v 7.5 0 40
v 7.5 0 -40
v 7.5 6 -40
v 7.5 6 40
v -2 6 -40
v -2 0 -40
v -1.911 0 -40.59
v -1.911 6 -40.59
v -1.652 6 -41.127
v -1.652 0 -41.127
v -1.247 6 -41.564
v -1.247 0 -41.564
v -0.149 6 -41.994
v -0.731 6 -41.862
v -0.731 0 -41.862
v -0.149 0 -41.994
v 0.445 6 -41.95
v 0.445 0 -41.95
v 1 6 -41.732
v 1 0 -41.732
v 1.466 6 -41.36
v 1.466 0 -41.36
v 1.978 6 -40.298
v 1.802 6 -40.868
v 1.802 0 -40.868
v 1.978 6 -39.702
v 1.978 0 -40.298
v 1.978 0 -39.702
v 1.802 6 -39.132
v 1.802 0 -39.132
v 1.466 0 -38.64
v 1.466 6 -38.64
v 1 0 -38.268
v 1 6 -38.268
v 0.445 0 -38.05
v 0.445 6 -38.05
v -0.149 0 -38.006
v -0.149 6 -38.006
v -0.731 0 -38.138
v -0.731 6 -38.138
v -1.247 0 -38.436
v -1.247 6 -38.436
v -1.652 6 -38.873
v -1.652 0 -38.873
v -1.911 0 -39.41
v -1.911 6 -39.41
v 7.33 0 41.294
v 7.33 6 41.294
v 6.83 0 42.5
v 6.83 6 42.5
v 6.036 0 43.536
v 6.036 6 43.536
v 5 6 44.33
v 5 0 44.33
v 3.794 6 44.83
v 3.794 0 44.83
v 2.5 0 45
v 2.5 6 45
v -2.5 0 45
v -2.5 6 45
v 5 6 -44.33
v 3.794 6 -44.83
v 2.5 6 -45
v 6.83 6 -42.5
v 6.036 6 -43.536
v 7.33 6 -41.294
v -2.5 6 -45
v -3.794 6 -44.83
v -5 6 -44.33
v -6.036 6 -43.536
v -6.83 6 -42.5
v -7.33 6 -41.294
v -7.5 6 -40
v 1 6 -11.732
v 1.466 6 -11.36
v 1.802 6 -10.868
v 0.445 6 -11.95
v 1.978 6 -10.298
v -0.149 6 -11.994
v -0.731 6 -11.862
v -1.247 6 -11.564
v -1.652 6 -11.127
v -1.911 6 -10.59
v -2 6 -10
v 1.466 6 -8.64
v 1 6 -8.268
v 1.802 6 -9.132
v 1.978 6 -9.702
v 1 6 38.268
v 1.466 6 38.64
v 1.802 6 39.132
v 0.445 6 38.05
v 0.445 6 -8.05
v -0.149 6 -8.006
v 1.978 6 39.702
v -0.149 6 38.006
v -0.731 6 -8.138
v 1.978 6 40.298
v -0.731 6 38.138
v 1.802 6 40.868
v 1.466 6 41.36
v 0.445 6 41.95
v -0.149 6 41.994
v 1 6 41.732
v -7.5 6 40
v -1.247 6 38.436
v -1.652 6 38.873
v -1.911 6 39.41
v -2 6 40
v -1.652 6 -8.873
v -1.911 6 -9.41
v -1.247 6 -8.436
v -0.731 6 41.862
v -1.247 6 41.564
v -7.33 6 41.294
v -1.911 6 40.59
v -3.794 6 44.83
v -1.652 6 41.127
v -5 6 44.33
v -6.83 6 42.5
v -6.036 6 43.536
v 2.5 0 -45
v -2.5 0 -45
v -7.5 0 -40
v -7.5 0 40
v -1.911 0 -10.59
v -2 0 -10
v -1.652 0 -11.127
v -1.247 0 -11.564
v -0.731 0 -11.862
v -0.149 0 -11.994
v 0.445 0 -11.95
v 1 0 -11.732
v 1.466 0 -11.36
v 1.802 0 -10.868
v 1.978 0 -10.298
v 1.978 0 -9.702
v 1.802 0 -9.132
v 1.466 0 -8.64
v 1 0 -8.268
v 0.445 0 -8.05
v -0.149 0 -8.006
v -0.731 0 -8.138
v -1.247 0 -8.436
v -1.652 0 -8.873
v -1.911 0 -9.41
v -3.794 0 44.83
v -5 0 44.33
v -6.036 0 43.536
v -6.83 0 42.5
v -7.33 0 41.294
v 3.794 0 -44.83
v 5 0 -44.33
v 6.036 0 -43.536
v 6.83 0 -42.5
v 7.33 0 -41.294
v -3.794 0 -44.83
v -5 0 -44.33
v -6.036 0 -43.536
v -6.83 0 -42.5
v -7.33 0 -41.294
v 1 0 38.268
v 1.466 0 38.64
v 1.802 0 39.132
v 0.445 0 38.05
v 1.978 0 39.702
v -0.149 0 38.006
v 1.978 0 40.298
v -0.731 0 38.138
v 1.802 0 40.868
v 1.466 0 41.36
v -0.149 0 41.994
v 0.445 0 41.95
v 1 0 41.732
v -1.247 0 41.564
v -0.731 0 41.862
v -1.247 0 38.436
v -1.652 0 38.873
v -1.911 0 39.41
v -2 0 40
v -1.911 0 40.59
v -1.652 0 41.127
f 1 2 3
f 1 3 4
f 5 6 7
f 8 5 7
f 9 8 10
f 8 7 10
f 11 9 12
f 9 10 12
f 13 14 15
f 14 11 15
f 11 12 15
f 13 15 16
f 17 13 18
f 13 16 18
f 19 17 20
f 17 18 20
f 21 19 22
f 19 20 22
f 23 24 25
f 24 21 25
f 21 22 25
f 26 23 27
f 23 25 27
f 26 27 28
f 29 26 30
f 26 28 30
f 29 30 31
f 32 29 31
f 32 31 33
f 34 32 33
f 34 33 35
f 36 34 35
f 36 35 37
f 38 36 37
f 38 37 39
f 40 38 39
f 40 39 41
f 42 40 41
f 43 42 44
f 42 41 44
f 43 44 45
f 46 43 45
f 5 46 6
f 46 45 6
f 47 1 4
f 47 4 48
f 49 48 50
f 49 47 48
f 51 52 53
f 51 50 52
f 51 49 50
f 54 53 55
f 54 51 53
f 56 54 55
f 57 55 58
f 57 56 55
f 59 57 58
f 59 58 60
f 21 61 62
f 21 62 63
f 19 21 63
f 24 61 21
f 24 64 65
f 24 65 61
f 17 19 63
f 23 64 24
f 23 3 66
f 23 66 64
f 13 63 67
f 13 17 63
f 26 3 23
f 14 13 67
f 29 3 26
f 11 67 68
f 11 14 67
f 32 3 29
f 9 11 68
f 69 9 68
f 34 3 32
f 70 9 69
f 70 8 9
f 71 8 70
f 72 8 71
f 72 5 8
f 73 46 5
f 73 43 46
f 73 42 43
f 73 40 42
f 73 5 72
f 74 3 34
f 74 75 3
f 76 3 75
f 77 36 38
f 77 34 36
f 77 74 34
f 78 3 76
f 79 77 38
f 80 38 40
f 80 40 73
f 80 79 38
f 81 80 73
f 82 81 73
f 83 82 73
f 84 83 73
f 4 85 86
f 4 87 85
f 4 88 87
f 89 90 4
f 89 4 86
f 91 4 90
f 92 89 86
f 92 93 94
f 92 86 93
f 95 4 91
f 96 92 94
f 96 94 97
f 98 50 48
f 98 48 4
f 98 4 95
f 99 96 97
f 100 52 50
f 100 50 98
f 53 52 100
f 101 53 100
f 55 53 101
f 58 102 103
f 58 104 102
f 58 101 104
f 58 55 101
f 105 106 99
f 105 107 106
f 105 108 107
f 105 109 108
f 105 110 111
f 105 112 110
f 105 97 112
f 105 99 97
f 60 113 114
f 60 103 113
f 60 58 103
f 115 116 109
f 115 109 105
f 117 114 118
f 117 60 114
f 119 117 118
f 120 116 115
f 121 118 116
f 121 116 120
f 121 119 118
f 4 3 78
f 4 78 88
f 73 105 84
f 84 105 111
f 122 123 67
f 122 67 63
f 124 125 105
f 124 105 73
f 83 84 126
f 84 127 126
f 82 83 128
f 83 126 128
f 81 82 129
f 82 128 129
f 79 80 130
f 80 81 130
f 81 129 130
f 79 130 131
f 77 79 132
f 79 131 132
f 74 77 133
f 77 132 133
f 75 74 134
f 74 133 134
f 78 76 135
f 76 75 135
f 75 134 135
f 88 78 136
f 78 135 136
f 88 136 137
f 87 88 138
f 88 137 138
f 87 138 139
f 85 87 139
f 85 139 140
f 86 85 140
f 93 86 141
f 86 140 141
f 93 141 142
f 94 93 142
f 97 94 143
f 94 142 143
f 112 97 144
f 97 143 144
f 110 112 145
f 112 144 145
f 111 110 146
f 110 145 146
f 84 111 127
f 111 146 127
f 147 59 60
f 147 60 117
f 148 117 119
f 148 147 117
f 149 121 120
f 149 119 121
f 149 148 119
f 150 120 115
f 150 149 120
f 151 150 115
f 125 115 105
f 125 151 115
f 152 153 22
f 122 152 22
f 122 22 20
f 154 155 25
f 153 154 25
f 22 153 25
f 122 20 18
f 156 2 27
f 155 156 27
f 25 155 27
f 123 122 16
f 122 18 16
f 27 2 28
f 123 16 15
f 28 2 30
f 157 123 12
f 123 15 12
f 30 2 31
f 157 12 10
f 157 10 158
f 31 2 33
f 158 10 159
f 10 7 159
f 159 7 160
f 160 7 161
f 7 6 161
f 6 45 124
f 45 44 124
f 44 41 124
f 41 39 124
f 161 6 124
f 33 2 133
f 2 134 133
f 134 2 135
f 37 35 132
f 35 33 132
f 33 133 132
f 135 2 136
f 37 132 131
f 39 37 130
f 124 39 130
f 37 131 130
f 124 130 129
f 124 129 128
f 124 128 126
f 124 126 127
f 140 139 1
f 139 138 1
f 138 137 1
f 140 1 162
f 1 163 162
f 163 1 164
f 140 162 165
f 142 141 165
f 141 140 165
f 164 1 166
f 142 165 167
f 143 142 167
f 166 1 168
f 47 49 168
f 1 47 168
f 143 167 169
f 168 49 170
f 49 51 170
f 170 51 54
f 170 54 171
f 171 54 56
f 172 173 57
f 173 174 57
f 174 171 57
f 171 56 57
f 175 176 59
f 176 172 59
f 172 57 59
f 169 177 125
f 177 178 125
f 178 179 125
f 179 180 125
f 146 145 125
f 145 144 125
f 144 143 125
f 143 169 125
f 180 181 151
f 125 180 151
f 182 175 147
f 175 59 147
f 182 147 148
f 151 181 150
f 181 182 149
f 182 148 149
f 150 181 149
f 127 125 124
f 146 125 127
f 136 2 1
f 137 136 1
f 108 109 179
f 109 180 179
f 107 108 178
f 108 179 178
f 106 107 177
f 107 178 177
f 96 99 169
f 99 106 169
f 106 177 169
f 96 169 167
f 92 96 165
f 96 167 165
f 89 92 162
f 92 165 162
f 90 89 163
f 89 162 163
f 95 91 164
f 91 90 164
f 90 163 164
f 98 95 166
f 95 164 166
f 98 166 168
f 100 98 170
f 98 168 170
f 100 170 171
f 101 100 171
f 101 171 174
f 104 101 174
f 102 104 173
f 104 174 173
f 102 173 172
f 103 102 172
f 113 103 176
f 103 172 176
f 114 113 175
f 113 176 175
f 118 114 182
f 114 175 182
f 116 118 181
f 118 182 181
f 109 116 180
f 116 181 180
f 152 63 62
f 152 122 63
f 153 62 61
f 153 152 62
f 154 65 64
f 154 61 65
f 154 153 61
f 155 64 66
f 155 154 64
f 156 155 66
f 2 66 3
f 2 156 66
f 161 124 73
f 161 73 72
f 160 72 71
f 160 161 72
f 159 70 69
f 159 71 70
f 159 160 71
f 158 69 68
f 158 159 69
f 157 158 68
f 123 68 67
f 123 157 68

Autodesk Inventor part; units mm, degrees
ref_plane "YZ Plane" through (0, 0, 0) normal (1, 0, 0) x (0, 1, 0)
ref_plane "XZ Plane" through (0, 0, 0) normal (0, 1, 0) x (-1, 0, 0)
ref_plane "XY Plane" through (0, 0, 0) normal (0, 0, 1) x (1, 0, 0)
sketch "Szkic1" plane through (0, 0, 0) normal (0, 1, 0) x (-1, 0, 0)
  line L0 (2.5, -45) -> (-2.5, -45)
  line L1 (-7.5, -40) -> (-7.5, 40)
  line L2 (-2.5, 45) -> (2.5, 45)
  line L3 (7.5, 40) -> (7.5, -40)
  line L4 (7.5, -45) -> (-7.5, 45) construction
  line L5 (-7.5, -45) -> (7.5, 45) construction
  arc A0 (7.5, 40) -> (2.5, 45) centre (2.5, 40) ccw
  arc A1 (-2.5, 45) -> (-7.5, 40) centre (-2.5, 40) ccw
  arc A2 (2.5, -45) -> (7.5, -40) centre (2.5, -40) ccw
  arc A3 (-7.5, -40) -> (-2.5, -45) centre (-2.5, -40) ccw
  circle A4 centre (0, 40) radius 2
  circle A5 centre (0, -10) radius 2
  circle A6 centre (0, -40) radius 2
  point P0 (0, 0)
  dimension "d0" = 15
  dimension "d1" = 90
  dimension "d2" = 5
  dimension "d3" = 4
  dimension "d4" = 4
  dimension "d5" = 4
extrude "Wyciągnięcie proste1" add sketch "Szkic1" along normal blind 6
properties part number "ArmLifter"
